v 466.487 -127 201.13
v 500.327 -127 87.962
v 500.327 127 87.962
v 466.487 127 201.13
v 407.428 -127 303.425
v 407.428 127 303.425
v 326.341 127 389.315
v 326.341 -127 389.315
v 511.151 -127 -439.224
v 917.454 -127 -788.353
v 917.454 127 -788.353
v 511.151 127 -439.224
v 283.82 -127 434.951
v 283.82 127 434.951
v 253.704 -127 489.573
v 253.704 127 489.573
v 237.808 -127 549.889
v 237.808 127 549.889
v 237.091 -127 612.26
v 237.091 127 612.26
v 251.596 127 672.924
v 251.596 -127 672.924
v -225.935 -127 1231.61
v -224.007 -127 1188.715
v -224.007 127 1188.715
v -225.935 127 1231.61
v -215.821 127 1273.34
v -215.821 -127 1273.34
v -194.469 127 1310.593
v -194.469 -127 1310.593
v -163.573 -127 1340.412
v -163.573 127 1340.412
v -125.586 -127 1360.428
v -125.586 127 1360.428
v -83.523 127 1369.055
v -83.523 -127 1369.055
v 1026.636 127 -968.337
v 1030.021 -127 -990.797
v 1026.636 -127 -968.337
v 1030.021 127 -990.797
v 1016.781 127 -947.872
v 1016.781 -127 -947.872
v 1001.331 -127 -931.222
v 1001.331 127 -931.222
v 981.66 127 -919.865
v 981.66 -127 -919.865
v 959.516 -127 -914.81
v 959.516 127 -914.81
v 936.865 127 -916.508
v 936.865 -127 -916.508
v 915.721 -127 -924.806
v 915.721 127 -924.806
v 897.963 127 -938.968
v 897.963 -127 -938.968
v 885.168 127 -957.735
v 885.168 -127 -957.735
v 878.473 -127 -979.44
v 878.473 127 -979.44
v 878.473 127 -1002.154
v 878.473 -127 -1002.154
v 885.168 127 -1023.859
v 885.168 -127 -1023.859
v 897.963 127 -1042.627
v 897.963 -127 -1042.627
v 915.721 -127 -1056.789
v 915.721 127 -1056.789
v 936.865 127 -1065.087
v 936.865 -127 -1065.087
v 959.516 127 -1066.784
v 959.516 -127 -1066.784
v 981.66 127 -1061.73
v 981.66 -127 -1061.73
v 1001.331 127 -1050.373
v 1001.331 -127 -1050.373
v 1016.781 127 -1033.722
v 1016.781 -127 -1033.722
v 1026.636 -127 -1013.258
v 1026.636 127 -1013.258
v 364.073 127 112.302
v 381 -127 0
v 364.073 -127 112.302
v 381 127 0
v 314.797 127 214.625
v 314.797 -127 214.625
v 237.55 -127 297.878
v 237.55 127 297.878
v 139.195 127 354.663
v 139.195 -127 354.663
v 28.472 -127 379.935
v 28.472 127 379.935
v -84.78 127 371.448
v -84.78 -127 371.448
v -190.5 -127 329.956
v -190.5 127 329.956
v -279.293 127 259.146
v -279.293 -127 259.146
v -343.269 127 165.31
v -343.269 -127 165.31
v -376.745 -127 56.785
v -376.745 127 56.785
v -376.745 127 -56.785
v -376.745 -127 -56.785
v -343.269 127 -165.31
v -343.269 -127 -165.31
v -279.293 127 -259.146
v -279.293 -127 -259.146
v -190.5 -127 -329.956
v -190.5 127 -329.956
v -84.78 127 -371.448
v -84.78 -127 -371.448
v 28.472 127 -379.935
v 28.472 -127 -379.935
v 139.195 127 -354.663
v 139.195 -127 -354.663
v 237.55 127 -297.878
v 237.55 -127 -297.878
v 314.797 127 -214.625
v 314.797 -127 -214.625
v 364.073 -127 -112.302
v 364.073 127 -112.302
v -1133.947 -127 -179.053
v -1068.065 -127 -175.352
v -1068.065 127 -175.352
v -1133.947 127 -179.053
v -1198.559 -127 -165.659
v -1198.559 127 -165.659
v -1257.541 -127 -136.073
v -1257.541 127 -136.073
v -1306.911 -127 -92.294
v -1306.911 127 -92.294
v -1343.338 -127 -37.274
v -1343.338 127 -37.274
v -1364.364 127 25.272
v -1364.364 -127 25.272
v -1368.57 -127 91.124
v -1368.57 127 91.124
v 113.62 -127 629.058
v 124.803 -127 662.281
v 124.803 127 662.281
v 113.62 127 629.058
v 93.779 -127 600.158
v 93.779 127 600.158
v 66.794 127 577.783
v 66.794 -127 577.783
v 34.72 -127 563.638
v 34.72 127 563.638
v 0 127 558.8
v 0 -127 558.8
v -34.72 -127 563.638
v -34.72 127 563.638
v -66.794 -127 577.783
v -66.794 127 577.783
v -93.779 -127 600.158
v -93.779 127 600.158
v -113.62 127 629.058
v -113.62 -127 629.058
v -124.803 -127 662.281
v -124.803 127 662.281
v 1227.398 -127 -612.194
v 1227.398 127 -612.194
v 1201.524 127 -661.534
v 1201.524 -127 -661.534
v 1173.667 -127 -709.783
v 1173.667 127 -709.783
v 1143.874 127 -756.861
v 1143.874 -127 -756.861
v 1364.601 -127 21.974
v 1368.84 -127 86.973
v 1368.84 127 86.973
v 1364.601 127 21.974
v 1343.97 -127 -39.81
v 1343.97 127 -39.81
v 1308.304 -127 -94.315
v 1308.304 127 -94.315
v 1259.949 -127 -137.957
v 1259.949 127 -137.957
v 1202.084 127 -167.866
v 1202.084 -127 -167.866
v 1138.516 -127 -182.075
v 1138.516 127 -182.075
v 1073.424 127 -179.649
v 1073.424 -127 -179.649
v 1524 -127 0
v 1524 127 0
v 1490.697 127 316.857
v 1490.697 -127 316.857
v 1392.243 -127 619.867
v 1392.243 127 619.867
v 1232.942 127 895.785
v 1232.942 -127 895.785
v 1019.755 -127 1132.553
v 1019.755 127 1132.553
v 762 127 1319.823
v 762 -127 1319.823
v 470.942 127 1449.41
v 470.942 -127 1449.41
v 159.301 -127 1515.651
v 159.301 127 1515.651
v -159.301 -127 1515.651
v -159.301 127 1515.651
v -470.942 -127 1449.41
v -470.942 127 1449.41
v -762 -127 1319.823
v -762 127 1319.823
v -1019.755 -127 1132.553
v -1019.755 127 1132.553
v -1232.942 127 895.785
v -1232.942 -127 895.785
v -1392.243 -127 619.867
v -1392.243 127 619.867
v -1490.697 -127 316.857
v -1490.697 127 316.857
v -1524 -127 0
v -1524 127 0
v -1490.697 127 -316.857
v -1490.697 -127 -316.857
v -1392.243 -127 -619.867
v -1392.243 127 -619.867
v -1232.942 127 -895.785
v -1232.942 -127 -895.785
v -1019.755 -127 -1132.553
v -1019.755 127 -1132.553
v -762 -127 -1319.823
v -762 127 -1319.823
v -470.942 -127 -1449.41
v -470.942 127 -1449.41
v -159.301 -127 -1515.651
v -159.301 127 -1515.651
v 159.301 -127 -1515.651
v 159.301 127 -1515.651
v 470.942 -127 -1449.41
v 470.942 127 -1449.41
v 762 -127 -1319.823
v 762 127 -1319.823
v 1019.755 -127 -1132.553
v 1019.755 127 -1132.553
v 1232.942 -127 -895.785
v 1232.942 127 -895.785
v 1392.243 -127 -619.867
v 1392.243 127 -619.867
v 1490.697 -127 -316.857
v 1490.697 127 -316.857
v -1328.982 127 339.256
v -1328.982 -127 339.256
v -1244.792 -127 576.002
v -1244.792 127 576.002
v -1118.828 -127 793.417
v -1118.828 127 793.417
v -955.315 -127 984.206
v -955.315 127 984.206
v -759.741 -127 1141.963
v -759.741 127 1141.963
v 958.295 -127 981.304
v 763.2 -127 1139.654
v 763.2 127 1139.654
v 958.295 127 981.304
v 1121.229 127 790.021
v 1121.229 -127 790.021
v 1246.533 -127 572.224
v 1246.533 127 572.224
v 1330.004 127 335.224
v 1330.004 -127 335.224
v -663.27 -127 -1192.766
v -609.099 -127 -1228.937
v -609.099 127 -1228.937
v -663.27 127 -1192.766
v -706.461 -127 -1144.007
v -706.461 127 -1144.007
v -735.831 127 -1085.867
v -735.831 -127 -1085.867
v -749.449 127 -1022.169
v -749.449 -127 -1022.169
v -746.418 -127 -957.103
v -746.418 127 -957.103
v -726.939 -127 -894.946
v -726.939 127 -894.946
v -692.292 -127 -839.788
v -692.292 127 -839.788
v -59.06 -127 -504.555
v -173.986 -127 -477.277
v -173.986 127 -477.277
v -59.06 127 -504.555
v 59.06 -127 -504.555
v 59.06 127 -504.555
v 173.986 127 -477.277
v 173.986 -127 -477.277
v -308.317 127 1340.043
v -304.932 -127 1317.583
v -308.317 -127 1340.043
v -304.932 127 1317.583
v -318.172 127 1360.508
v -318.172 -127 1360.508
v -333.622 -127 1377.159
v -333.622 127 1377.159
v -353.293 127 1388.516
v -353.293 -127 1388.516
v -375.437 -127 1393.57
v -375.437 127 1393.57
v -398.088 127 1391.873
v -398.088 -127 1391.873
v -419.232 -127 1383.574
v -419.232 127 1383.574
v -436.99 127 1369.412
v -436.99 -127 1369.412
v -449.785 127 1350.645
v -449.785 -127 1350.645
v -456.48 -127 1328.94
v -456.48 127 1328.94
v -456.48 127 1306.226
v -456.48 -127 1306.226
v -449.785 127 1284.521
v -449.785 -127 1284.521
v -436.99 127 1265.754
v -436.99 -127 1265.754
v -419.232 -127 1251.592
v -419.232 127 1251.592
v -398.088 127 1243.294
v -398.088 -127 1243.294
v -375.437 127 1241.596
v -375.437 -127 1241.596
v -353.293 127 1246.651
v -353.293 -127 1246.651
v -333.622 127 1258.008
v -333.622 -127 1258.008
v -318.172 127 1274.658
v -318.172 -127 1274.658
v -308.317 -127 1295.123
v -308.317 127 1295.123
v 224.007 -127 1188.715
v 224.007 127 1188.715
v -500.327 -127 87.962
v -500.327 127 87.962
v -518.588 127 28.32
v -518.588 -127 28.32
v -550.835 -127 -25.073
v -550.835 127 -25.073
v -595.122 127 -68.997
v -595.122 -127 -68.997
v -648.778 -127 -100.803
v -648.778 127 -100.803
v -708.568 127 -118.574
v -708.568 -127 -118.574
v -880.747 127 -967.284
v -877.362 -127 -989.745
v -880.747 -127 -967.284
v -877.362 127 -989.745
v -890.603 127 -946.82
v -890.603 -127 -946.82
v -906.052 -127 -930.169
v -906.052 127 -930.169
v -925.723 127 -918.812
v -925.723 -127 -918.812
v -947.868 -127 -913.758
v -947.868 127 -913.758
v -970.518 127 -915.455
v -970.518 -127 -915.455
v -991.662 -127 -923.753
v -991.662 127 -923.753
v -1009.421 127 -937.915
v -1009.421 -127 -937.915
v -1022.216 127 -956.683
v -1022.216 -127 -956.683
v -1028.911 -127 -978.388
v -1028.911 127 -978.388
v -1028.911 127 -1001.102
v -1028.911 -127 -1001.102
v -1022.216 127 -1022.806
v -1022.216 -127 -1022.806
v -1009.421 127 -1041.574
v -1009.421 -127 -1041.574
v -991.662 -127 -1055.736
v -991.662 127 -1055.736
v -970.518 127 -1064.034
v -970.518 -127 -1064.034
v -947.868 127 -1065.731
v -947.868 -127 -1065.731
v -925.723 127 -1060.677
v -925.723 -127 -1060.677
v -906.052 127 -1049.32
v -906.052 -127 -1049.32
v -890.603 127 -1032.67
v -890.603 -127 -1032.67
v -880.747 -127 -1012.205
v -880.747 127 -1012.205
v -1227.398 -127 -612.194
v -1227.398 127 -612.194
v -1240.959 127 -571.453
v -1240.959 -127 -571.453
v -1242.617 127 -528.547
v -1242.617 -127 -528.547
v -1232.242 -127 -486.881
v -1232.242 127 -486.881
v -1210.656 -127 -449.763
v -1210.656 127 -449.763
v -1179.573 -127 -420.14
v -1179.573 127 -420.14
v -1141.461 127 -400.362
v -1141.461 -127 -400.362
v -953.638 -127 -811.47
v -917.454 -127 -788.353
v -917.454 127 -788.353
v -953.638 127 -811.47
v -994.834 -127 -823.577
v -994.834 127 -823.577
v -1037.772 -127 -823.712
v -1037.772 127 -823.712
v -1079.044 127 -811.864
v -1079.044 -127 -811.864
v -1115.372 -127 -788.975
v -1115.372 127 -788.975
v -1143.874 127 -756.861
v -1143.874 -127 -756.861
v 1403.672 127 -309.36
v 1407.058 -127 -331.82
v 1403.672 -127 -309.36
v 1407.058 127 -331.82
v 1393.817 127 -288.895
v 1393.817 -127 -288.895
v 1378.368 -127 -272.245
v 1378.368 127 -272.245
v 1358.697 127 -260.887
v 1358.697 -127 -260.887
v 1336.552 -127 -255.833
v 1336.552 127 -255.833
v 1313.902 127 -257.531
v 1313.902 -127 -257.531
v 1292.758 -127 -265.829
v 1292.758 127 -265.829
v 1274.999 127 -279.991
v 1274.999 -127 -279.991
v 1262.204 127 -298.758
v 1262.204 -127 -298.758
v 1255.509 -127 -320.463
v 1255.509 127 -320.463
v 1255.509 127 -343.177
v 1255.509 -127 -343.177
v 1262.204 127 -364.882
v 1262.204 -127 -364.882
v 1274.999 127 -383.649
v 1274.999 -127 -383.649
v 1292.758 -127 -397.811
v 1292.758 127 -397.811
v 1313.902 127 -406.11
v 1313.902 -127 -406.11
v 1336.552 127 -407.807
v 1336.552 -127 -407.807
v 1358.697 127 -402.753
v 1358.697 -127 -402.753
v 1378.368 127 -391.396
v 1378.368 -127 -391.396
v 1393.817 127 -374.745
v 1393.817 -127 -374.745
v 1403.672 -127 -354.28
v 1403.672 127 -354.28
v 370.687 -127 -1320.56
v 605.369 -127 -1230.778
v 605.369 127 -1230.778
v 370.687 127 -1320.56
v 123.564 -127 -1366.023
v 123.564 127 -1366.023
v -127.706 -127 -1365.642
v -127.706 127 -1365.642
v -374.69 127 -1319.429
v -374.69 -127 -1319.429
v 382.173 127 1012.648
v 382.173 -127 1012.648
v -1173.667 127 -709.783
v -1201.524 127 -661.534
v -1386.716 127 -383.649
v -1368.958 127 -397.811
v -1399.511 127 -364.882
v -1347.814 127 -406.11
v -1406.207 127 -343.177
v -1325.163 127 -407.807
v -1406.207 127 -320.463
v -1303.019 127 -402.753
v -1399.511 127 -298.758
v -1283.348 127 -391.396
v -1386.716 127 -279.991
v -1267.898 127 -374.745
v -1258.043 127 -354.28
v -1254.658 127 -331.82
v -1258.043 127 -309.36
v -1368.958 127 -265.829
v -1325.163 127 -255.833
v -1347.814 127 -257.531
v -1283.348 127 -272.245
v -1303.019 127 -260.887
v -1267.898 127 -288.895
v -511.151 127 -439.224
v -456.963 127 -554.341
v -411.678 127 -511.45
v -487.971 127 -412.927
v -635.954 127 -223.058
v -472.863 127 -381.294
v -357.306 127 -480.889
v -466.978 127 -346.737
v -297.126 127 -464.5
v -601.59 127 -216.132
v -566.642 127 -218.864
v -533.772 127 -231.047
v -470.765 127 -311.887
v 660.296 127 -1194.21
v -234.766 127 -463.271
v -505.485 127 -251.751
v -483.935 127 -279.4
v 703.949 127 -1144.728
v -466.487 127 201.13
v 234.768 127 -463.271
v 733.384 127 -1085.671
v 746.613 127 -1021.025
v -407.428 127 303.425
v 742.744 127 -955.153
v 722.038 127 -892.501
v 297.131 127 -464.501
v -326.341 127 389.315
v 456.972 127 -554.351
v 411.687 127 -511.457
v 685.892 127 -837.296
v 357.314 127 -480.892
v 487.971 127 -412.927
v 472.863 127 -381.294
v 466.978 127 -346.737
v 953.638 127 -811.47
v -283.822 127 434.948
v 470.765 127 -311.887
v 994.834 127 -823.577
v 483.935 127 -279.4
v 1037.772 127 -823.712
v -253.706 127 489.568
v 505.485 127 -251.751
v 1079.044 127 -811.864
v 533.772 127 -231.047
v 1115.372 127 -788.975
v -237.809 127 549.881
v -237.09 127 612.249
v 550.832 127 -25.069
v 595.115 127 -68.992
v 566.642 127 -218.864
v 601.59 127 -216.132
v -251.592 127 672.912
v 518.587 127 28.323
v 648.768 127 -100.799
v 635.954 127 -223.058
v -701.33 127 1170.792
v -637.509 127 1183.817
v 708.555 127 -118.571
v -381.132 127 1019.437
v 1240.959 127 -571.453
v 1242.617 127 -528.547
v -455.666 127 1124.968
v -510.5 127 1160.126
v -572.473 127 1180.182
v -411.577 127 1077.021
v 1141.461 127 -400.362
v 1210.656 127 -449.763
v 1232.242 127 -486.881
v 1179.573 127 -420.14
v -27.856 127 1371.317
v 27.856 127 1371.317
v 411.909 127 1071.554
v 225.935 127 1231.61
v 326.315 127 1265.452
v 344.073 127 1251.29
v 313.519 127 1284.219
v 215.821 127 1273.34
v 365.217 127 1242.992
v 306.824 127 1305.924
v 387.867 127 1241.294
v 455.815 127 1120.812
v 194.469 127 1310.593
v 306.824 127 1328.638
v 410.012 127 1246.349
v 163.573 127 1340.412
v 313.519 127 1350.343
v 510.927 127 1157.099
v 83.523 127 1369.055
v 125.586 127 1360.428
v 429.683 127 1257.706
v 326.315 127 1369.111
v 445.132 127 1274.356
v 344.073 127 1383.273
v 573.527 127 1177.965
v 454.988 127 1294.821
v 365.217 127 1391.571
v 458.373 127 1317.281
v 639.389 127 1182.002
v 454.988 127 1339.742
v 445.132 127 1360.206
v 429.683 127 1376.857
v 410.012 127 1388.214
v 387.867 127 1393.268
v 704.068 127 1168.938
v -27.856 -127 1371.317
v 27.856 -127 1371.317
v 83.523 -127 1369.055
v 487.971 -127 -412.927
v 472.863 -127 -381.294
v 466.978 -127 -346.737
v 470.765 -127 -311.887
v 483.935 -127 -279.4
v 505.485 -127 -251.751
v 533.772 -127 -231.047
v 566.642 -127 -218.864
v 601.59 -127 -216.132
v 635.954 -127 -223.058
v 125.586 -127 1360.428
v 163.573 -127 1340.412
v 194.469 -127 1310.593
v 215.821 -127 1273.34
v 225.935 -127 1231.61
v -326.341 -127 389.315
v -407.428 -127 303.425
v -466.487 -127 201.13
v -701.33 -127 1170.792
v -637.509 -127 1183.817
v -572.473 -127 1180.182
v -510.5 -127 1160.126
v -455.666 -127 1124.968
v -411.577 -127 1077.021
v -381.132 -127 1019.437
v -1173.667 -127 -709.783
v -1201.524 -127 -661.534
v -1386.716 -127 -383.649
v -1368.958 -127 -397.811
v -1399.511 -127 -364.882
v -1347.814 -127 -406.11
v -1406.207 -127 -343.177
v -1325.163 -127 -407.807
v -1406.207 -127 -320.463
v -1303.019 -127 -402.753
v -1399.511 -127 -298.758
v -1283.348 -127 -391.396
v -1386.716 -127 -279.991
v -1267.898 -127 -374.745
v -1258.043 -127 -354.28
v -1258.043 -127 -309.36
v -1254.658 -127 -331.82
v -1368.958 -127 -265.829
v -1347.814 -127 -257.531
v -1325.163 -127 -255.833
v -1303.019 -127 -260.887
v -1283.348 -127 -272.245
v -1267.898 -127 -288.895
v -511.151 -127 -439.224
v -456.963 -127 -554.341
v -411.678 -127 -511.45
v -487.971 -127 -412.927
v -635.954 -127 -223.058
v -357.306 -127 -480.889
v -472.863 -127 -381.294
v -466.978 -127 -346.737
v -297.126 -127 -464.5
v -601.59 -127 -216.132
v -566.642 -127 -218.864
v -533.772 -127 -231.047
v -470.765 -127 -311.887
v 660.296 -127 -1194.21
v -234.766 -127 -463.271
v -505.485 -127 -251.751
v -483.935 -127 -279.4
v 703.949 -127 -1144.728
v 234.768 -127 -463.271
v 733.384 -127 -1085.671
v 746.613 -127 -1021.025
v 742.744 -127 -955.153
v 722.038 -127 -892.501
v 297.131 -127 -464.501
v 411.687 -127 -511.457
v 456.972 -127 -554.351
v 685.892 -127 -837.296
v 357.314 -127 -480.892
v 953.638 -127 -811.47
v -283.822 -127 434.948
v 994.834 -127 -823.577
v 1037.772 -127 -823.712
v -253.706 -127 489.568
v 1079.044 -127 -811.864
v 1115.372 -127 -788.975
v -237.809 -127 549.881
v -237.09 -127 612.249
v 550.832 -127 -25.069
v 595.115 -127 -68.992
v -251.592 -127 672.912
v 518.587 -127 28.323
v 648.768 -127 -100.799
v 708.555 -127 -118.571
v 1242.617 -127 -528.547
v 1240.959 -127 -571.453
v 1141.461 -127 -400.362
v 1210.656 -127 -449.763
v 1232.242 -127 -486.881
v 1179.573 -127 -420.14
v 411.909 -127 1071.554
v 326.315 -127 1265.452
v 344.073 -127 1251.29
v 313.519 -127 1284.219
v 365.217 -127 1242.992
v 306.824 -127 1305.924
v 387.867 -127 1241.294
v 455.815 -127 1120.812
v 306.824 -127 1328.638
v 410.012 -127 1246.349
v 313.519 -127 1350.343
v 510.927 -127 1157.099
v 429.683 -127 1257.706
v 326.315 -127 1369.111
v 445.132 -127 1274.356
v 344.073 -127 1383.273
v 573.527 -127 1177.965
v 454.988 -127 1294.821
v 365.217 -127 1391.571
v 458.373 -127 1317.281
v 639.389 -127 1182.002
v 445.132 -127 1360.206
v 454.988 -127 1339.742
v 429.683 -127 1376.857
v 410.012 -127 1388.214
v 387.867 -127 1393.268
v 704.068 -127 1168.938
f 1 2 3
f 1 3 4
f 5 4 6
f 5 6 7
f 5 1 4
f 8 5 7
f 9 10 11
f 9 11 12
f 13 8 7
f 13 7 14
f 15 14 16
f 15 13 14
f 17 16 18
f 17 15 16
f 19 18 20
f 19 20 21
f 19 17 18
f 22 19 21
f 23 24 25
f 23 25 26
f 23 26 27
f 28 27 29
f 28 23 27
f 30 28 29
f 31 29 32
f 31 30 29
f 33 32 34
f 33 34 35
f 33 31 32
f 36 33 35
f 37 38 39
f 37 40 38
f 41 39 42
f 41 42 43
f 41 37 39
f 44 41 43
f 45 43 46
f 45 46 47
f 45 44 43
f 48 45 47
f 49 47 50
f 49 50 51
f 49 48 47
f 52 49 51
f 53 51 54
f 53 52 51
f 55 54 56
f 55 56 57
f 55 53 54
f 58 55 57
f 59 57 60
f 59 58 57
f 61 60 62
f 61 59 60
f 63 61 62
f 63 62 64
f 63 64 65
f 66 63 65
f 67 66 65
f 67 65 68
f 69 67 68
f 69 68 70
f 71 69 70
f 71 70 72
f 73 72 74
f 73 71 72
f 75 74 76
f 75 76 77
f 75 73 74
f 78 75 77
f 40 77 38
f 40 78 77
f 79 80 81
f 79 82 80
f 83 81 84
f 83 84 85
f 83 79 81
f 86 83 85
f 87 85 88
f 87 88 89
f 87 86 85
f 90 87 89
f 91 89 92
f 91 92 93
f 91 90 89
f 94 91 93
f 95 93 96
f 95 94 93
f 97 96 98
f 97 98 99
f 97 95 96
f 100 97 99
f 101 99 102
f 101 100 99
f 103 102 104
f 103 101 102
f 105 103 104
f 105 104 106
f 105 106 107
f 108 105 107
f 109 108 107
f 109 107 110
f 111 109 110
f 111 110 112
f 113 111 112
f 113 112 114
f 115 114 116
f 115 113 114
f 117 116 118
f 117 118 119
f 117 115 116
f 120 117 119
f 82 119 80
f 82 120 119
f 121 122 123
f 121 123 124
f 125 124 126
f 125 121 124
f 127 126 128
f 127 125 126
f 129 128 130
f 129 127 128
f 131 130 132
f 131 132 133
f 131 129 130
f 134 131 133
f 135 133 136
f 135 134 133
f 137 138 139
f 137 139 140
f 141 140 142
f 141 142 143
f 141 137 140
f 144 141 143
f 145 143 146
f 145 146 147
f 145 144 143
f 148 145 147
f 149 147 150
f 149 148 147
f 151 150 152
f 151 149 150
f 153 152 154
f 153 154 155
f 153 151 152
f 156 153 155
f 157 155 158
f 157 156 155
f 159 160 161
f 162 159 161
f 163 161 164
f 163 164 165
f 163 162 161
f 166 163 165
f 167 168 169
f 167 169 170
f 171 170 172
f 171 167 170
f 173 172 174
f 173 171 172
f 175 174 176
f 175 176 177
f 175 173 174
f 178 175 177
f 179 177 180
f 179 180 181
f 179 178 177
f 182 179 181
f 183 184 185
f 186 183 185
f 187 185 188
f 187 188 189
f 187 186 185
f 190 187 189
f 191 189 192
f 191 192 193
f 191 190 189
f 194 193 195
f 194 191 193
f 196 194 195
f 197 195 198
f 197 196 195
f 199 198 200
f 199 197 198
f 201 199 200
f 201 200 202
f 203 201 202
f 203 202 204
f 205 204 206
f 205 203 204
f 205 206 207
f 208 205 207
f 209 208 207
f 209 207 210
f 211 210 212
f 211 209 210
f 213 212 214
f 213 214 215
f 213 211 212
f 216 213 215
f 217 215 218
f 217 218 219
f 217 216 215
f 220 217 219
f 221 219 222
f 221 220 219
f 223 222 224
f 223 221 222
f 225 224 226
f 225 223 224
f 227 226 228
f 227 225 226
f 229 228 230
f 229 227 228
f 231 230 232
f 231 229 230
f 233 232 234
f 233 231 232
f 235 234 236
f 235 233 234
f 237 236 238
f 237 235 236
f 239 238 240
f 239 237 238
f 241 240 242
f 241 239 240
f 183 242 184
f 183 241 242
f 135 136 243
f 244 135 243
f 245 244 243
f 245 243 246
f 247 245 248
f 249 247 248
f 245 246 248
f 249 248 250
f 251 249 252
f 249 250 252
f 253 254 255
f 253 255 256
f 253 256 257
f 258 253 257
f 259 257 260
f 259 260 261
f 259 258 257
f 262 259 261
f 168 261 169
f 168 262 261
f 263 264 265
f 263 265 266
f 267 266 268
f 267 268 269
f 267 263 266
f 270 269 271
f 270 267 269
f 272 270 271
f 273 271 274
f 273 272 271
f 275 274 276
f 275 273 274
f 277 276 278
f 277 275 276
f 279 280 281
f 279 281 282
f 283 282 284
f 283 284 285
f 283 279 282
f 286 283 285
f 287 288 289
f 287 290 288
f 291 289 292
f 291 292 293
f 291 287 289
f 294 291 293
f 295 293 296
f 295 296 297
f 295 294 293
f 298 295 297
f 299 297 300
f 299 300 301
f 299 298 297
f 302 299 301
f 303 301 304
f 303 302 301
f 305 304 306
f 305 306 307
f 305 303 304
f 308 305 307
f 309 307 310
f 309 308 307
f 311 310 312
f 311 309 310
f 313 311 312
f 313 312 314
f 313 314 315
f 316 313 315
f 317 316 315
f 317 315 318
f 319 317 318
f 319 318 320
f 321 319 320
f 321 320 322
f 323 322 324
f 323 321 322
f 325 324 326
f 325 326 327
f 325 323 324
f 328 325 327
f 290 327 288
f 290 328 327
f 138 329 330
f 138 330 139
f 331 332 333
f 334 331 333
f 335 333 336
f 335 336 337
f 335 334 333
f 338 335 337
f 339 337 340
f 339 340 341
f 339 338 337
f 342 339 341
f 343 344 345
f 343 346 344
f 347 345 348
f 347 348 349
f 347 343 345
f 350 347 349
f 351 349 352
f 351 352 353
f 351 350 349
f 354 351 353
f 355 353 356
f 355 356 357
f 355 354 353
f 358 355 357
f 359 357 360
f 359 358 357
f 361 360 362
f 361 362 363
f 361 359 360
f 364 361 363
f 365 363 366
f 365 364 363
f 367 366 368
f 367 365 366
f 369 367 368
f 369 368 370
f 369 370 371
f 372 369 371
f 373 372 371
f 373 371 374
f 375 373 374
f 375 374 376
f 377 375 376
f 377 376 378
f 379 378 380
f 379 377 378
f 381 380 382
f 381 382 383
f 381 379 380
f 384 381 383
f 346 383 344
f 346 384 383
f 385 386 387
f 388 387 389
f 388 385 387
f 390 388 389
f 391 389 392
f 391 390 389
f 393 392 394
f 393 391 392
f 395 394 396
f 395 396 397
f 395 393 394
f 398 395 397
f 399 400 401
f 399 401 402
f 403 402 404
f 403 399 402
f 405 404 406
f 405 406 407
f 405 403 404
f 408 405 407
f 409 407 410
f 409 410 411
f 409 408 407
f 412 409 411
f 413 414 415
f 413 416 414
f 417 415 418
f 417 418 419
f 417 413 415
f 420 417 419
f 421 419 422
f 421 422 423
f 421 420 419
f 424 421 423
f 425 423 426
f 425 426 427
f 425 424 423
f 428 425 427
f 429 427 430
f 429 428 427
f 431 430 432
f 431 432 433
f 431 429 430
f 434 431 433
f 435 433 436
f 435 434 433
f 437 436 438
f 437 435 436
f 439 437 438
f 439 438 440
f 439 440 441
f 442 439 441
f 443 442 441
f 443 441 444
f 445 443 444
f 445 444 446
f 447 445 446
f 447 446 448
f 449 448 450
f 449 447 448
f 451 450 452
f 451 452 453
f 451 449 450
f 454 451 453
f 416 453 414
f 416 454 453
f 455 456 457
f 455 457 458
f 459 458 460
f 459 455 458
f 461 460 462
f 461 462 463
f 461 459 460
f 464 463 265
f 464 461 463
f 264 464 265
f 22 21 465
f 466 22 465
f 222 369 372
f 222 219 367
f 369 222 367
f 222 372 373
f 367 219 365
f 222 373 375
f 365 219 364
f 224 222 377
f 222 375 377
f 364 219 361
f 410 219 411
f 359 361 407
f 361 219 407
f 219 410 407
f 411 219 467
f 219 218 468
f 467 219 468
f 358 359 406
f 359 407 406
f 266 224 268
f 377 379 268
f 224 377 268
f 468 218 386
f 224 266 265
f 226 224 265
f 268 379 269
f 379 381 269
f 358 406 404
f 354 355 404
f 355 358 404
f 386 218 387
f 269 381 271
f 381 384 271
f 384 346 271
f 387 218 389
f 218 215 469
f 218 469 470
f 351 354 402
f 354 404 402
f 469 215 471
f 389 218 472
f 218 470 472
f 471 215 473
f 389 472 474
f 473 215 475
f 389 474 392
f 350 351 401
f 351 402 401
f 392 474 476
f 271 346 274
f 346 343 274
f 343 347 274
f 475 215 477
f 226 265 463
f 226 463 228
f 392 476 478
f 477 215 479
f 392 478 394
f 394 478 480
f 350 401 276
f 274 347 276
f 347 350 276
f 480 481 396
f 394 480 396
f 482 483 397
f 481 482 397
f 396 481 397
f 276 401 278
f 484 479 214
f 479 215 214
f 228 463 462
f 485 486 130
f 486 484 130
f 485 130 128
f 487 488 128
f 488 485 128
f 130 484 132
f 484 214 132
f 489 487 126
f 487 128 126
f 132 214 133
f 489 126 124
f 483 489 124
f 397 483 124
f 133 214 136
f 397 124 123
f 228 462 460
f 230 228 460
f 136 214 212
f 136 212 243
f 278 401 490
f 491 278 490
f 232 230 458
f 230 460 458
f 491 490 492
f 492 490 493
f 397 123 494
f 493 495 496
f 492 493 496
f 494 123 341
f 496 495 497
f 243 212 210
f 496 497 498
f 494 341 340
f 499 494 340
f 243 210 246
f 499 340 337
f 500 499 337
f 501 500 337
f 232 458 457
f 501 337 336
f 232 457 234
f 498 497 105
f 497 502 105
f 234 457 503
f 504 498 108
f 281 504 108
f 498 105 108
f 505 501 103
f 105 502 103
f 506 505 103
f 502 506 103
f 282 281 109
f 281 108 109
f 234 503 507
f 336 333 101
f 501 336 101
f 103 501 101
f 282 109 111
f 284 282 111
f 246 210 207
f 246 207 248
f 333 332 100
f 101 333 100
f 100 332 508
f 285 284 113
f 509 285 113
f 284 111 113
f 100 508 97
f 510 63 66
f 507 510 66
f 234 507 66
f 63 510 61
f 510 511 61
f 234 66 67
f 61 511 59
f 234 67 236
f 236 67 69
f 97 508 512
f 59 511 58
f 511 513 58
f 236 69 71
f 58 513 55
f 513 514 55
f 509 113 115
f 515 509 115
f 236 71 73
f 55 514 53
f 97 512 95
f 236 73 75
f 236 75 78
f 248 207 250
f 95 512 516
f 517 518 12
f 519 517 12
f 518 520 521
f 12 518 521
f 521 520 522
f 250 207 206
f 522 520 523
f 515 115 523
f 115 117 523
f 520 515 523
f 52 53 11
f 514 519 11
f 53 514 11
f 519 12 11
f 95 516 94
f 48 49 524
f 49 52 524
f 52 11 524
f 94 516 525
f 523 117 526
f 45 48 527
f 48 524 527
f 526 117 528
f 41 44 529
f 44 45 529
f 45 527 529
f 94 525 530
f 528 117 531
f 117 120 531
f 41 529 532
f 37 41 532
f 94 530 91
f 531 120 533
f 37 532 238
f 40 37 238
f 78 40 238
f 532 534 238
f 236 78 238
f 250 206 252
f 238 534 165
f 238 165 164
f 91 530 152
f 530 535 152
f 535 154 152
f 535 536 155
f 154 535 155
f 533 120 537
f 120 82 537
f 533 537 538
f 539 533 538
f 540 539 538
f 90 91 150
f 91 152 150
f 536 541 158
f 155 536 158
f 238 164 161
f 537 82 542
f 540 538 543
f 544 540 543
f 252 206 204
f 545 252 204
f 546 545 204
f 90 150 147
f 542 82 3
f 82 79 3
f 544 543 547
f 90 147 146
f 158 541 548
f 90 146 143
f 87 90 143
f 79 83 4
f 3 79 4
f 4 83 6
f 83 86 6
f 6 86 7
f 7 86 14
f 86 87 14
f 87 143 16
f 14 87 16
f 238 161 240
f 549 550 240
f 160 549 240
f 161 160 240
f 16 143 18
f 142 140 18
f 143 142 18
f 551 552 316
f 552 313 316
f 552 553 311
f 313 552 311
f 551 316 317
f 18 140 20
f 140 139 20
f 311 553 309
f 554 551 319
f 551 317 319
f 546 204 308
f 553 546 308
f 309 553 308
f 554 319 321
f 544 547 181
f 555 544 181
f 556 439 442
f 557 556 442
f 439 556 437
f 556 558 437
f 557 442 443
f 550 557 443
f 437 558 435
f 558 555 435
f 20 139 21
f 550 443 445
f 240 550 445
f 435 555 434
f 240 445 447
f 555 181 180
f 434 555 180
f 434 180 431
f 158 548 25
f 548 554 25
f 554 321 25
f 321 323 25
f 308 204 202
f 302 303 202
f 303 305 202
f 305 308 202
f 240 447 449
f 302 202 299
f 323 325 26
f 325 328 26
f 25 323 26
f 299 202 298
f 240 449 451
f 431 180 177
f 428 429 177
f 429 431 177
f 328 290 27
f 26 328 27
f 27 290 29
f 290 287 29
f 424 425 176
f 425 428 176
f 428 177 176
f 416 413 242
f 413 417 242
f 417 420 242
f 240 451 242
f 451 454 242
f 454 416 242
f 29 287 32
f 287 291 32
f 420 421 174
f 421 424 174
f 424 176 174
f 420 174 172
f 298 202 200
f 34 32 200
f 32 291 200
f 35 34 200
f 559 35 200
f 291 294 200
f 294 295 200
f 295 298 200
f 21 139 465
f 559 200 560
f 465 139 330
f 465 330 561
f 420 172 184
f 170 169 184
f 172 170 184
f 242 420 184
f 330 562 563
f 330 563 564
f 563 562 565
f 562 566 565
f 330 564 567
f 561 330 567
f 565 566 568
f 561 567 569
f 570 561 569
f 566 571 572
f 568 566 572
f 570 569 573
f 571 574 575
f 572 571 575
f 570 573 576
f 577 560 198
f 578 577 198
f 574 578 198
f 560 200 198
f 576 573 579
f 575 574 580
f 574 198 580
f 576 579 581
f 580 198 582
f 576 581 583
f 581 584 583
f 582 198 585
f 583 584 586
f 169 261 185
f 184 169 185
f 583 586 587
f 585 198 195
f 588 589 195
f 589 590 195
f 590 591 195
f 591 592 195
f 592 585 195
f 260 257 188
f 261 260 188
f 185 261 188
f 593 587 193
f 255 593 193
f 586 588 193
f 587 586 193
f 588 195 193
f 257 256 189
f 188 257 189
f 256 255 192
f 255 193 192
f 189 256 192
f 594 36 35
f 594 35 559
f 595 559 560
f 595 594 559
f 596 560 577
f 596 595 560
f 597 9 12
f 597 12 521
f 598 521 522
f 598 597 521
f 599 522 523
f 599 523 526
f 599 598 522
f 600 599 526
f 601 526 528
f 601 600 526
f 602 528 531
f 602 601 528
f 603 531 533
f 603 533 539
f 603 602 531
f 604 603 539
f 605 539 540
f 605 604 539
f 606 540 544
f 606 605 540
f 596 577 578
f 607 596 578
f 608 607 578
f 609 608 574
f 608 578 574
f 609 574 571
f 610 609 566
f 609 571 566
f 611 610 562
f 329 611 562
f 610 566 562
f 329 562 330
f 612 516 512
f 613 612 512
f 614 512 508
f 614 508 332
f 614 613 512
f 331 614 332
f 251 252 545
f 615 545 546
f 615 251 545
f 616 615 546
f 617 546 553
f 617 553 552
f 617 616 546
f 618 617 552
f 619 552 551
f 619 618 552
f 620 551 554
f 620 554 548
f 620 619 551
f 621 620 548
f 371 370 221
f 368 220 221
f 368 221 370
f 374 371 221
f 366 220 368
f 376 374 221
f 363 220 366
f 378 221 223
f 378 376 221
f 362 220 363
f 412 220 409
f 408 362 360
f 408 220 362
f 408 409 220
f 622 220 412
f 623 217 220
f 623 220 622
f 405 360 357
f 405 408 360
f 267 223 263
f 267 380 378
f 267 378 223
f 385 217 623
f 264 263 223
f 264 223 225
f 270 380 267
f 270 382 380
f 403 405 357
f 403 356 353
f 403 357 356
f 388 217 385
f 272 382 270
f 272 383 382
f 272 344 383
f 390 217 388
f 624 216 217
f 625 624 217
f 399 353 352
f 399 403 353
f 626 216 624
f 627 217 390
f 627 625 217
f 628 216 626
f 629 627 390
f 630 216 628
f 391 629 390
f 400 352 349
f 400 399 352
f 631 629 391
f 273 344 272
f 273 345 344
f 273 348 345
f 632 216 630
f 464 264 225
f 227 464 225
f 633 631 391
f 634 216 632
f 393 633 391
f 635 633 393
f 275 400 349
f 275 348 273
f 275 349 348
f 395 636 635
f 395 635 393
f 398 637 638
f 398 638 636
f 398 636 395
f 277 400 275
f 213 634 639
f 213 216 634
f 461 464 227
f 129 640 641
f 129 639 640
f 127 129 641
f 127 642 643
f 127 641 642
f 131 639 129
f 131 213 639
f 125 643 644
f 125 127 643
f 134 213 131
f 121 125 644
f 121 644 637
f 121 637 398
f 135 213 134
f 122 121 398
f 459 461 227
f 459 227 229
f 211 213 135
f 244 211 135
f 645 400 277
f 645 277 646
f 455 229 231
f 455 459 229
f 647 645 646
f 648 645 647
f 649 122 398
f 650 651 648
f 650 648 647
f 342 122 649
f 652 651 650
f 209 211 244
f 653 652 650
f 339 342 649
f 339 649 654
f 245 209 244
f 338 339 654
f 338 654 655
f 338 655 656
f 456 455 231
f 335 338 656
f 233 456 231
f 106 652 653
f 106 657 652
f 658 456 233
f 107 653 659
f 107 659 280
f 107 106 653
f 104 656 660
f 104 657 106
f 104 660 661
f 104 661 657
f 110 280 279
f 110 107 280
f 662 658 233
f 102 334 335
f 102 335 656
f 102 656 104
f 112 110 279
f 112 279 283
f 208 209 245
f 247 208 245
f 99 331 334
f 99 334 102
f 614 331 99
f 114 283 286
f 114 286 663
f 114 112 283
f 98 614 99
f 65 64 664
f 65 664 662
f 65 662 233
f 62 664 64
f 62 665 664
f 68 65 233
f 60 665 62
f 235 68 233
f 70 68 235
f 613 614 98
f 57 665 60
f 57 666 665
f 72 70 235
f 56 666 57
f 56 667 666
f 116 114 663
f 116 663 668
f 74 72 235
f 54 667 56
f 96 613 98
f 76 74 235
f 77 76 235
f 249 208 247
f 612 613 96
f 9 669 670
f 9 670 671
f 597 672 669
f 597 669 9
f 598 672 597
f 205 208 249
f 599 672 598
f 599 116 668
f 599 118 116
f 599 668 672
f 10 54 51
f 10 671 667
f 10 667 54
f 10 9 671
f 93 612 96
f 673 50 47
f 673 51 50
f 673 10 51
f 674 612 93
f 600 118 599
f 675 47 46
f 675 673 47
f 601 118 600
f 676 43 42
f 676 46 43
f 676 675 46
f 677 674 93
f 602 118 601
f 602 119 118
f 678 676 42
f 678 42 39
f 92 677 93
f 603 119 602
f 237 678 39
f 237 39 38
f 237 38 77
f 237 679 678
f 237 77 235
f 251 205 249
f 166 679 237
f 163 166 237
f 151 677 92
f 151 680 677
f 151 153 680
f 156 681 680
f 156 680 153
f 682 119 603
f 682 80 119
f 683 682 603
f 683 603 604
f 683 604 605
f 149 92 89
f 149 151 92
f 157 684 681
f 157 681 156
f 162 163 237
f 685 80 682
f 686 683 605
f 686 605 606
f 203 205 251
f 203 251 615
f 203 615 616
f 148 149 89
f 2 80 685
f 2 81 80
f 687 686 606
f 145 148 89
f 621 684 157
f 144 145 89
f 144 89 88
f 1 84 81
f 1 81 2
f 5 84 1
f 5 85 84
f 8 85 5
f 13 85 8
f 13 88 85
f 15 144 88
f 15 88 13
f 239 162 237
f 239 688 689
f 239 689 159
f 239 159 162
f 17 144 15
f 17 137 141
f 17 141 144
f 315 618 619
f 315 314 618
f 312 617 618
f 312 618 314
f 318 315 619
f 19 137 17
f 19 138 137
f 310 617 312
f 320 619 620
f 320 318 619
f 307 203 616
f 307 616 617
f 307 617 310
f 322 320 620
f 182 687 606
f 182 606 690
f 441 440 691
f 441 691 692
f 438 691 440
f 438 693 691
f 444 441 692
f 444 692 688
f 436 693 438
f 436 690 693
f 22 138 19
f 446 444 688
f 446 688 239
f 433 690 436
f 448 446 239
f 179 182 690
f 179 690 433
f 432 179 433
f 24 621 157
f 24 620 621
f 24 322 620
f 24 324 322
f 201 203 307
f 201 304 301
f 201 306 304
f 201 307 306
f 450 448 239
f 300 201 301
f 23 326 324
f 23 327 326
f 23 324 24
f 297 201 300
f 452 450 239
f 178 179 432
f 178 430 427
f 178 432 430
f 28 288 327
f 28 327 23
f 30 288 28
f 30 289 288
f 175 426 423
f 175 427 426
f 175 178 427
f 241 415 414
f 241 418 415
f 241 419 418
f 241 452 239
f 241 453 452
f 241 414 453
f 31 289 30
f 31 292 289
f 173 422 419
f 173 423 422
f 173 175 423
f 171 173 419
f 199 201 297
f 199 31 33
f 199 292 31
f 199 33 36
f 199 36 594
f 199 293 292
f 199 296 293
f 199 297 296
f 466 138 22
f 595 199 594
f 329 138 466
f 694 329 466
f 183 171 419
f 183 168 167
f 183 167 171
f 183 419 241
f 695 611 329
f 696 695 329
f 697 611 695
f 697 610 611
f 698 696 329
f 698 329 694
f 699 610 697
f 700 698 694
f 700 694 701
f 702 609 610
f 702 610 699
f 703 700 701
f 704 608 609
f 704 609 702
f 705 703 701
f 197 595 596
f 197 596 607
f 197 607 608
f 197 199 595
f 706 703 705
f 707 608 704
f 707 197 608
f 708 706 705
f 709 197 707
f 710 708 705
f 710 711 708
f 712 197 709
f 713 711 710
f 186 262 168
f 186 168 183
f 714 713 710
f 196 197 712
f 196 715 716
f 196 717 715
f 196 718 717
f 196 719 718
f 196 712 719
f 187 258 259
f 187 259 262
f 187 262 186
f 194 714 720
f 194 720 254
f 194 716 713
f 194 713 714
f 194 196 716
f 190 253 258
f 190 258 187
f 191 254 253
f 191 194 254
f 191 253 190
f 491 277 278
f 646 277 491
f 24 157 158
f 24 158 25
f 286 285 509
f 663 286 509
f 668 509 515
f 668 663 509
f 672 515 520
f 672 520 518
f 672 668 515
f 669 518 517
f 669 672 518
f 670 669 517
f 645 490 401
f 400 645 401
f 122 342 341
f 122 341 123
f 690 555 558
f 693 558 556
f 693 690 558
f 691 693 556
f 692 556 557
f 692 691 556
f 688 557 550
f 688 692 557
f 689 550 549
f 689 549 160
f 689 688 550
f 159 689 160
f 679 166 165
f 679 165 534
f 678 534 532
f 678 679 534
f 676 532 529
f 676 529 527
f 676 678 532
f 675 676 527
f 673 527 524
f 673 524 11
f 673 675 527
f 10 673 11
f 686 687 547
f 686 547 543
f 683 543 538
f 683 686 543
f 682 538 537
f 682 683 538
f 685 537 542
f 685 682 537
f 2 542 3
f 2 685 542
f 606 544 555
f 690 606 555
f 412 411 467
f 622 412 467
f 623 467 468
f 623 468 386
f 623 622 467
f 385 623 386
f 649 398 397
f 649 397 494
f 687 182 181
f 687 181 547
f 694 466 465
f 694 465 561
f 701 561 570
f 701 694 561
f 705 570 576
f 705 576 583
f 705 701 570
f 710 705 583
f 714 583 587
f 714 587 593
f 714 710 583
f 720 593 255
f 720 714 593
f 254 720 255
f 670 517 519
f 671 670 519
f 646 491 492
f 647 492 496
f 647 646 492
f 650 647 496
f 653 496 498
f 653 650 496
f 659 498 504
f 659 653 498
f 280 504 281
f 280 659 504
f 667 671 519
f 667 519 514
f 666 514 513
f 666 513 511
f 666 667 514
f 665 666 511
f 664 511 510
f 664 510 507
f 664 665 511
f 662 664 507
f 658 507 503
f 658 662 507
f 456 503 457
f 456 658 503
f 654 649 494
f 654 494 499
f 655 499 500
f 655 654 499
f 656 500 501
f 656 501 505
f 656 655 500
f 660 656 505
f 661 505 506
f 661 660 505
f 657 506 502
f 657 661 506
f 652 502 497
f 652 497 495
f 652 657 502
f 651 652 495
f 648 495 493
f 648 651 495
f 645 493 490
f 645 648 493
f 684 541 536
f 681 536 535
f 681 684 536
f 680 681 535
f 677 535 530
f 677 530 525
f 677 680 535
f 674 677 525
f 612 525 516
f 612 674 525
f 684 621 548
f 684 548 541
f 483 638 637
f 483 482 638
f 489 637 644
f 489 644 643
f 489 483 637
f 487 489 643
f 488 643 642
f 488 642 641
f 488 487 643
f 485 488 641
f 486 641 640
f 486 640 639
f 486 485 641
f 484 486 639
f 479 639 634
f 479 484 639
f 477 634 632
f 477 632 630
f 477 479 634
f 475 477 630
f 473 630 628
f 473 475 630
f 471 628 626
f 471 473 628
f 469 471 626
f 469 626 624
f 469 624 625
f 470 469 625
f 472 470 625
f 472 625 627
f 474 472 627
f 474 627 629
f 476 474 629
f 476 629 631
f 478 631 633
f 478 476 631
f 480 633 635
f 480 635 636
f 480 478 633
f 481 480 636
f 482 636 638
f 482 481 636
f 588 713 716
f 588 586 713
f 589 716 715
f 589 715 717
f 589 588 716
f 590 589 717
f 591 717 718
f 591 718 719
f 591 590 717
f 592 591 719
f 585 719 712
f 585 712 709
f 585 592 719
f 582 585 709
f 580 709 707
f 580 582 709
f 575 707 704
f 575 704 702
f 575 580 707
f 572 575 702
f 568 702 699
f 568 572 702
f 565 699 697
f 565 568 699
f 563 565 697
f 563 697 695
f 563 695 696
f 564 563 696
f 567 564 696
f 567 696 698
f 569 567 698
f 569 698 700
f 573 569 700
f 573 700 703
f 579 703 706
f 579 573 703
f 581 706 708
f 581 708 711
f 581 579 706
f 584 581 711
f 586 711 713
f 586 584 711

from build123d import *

# Parameters (mm, degrees)
F0_R     = 1524
F0_R_2   = 76.2
F0_R_3   = 381
F1_DEPTH = 127


with BuildPart() as f1:
    # F0 (on Front) → F1 (new body, symmetric)
    with BuildSketch(Plane.XZ):
        Circle(F0_R)
        with Locations((-953.5620317593, -989.7445528567)):
            Circle(F0_R_2, mode=Mode.SUBTRACT)
        with BuildLine():
            ThreePointArc((-456.963354047, -554.3408762981), (-327.721089545, -470.8403186392), (-173.9859882065, -477.2765193342))
            ThreePointArc((-173.9859882065, -477.2765193342), (0, -508), (173.9859882065, -477.2765193342))
            ThreePointArc((173.9859882065, -477.2765193342), (327.7273635176, -470.8420273415), (456.9716264903, -554.3509110508))
            Line((456.9716264903, -554.3509110508), (685.8923624469, -837.2955798757))
            ThreePointArc((685.8923624469, -837.2955798757), (742.1068405038, -1053.7797989831), (605.369402218, -1230.7779843885))
            ThreePointArc((605.369402218, -1230.7779843885), (-2.0796992464, -1371.5984233183), (-609.0989679173, -1228.936535091))
            ThreePointArc((-609.0989679173, -1228.936535091), (-744.6902377392, -1054.4566551818), (-692.2922703786, -839.7879011408))
            Line((-692.2922703786, -839.7879011408), (-456.963354047, -554.3408762981))
        make_face(mode=Mode.SUBTRACT)
        with BuildLine():
            Line((-1141.4610121703, -400.3618834196), (-635.9542686597, -223.057858354))
            ThreePointArc((-635.9542686597, -223.057858354), (-483.9349956347, -279.4), (-511.1509061782, -439.2236231275))
            Line((-511.1509061782, -439.2236231275), (-917.4540678335, -788.3532922592))
            ThreePointArc((-917.4540678335, -788.3532922592), (-1037.7723998445, -823.7118343225), (-1143.8744025578, -756.8605625695))
            ThreePointArc((-1143.8744025578, -756.8605625695), (-1187.8404438307, -685.8), (-1227.3976755867, -612.1940100691))
            ThreePointArc((-1227.3976755867, -612.1940100691), (-1232.2415738434, -486.8813444505), (-1141.4610121703, -400.3618834196))
        make_face(mode=Mode.SUBTRACT)
        with Locations((-1330.8576181602, -331.8200720045)):
            Circle(F0_R_2, mode=Mode.SUBTRACT)
        with Locations((953.8214978061, -990.797417367)):
            Circle(F0_R_2, mode=Mode.SUBTRACT)
        with BuildLine():
            Line((917.4540678335, -788.3532922592), (511.1509061782, -439.2236231275))
            ThreePointArc((511.1509061782, -439.2236231275), (483.9349956347, -279.4), (635.9542686597, -223.057858354))
            Line((635.9542686597, -223.057858354), (1141.4610121703, -400.3618834196))
            ThreePointArc((1141.4610121703, -400.3618834196), (1232.2415738434, -486.8813444505), (1227.3976755867, -612.1940100691))
            ThreePointArc((1227.3976755867, -612.1940100691), (1187.8404438307, -685.8), (1143.8744025578, -756.8605625695))
            ThreePointArc((1143.8744025578, -756.8605625695), (1037.7723998445, -823.7118343225), (917.4540678335, -788.3532922592))
        make_face(mode=Mode.SUBTRACT)
        with Locations((1330.8576181602, -331.8200720043)):
            Circle(F0_R_2, mode=Mode.SUBTRACT)
        with BuildLine():
            ThreePointArc((-500.3265844765, 87.9619739777), (-571.6248386059, -48.3992086508), (-708.5677848262, -118.5735818239))
            Line((-708.5677848262, -118.5735818239), (-1068.0654238722, -175.3524202029))
            ThreePointArc((-1068.0654238722, -175.3524202029), (-1283.6534961661, -115.793476707), (-1368.569702008, 91.1237111996))
            ThreePointArc((-1368.569702008, 91.1237111996), (-1186.7992287612, 687.6002840388), (-759.740775069, 1141.9634471808))
            ThreePointArc((-759.740775069, 1141.9634471808), (-540.8411317074, 1172.1489914233), (-381.1315209894, 1019.4366435619))
            Line((-381.1315209894, 1019.4366435619), (-251.5916042068, 672.9123113523))
            ThreePointArc((-251.5916042068, 672.9123113523), (-243.899132295, 519.2349482215), (-326.34059627, 389.3145453565))
            ThreePointArc((-326.34059627, 389.3145453565), (-439.9409051225, 254), (-500.3265844765, 87.9619739777))
        make_face(mode=Mode.SUBTRACT)
        with Locations((-381.1315209894, 1317.5831373041)):
            Circle(F0_R_2, mode=Mode.SUBTRACT)
        Circle(F0_R_3, mode=Mode.SUBTRACT)
        with BuildLine():
            ThreePointArc((708.5549582538, -118.5714350542), (571.62022184, -48.3946295823), (500.3265844765, 87.9619739778))
            ThreePointArc((500.3265844765, 87.9619739778), (439.9409051225, 254), (326.34059627, 389.3145453565))
            ThreePointArc((326.34059627, 389.3145453565), (243.8974750883, 519.2412359922), (251.5961583359, 672.9244928747))
            Line((251.5961583359, 672.9244928747), (382.1730614253, 1012.6480000786))
            ThreePointArc((382.1730614253, 1012.6480000786), (541.5466556623, 1169.5732756901), (763.20029979, 1139.6542731888))
            ThreePointArc((763.20029979, 1139.6542731888), (1188.8789280076, 683.9981392796), (1368.8397429863, 86.9730879103))
            ThreePointArc((1368.8397429863, 86.9730879103), (1285.5313694466, -117.6923362415), (1073.423791368, -179.6487424211))
            Line((1073.423791368, -179.6487424211), (708.5549582538, -118.5714350542))
        make_face(mode=Mode.SUBTRACT)
        with BuildLine():
            ThreePointArc((-224.0069443368, 1188.7151756787), (-194.4691739989, 1310.5931787729), (-83.5232730288, 1369.0545726386))
            ThreePointArc((-83.5232730288, 1369.0545726386), (0, 1371.6), (83.5232730288, 1369.0545726386))
            ThreePointArc((83.5232730288, 1369.0545726386), (194.4691739989, 1310.5931787729), (224.0069443368, 1188.7151756787))
            Line((224.0069443368, 1188.7151756787), (124.8033624815, 662.2814814815))
            ThreePointArc((124.8033624815, 662.2814814815), (0, 558.8), (-124.8033624815, 662.2814814815))
            Line((-124.8033624815, 662.2814814815), (-224.0069443368, 1188.7151756787))
        make_face(mode=Mode.SUBTRACT)
        with Locations((382.1730614253, 1317.2814092368)):
            Circle(F0_R_2, mode=Mode.SUBTRACT)
    extrude(amount=F1_DEPTH, both=True)


solid = f1.part
